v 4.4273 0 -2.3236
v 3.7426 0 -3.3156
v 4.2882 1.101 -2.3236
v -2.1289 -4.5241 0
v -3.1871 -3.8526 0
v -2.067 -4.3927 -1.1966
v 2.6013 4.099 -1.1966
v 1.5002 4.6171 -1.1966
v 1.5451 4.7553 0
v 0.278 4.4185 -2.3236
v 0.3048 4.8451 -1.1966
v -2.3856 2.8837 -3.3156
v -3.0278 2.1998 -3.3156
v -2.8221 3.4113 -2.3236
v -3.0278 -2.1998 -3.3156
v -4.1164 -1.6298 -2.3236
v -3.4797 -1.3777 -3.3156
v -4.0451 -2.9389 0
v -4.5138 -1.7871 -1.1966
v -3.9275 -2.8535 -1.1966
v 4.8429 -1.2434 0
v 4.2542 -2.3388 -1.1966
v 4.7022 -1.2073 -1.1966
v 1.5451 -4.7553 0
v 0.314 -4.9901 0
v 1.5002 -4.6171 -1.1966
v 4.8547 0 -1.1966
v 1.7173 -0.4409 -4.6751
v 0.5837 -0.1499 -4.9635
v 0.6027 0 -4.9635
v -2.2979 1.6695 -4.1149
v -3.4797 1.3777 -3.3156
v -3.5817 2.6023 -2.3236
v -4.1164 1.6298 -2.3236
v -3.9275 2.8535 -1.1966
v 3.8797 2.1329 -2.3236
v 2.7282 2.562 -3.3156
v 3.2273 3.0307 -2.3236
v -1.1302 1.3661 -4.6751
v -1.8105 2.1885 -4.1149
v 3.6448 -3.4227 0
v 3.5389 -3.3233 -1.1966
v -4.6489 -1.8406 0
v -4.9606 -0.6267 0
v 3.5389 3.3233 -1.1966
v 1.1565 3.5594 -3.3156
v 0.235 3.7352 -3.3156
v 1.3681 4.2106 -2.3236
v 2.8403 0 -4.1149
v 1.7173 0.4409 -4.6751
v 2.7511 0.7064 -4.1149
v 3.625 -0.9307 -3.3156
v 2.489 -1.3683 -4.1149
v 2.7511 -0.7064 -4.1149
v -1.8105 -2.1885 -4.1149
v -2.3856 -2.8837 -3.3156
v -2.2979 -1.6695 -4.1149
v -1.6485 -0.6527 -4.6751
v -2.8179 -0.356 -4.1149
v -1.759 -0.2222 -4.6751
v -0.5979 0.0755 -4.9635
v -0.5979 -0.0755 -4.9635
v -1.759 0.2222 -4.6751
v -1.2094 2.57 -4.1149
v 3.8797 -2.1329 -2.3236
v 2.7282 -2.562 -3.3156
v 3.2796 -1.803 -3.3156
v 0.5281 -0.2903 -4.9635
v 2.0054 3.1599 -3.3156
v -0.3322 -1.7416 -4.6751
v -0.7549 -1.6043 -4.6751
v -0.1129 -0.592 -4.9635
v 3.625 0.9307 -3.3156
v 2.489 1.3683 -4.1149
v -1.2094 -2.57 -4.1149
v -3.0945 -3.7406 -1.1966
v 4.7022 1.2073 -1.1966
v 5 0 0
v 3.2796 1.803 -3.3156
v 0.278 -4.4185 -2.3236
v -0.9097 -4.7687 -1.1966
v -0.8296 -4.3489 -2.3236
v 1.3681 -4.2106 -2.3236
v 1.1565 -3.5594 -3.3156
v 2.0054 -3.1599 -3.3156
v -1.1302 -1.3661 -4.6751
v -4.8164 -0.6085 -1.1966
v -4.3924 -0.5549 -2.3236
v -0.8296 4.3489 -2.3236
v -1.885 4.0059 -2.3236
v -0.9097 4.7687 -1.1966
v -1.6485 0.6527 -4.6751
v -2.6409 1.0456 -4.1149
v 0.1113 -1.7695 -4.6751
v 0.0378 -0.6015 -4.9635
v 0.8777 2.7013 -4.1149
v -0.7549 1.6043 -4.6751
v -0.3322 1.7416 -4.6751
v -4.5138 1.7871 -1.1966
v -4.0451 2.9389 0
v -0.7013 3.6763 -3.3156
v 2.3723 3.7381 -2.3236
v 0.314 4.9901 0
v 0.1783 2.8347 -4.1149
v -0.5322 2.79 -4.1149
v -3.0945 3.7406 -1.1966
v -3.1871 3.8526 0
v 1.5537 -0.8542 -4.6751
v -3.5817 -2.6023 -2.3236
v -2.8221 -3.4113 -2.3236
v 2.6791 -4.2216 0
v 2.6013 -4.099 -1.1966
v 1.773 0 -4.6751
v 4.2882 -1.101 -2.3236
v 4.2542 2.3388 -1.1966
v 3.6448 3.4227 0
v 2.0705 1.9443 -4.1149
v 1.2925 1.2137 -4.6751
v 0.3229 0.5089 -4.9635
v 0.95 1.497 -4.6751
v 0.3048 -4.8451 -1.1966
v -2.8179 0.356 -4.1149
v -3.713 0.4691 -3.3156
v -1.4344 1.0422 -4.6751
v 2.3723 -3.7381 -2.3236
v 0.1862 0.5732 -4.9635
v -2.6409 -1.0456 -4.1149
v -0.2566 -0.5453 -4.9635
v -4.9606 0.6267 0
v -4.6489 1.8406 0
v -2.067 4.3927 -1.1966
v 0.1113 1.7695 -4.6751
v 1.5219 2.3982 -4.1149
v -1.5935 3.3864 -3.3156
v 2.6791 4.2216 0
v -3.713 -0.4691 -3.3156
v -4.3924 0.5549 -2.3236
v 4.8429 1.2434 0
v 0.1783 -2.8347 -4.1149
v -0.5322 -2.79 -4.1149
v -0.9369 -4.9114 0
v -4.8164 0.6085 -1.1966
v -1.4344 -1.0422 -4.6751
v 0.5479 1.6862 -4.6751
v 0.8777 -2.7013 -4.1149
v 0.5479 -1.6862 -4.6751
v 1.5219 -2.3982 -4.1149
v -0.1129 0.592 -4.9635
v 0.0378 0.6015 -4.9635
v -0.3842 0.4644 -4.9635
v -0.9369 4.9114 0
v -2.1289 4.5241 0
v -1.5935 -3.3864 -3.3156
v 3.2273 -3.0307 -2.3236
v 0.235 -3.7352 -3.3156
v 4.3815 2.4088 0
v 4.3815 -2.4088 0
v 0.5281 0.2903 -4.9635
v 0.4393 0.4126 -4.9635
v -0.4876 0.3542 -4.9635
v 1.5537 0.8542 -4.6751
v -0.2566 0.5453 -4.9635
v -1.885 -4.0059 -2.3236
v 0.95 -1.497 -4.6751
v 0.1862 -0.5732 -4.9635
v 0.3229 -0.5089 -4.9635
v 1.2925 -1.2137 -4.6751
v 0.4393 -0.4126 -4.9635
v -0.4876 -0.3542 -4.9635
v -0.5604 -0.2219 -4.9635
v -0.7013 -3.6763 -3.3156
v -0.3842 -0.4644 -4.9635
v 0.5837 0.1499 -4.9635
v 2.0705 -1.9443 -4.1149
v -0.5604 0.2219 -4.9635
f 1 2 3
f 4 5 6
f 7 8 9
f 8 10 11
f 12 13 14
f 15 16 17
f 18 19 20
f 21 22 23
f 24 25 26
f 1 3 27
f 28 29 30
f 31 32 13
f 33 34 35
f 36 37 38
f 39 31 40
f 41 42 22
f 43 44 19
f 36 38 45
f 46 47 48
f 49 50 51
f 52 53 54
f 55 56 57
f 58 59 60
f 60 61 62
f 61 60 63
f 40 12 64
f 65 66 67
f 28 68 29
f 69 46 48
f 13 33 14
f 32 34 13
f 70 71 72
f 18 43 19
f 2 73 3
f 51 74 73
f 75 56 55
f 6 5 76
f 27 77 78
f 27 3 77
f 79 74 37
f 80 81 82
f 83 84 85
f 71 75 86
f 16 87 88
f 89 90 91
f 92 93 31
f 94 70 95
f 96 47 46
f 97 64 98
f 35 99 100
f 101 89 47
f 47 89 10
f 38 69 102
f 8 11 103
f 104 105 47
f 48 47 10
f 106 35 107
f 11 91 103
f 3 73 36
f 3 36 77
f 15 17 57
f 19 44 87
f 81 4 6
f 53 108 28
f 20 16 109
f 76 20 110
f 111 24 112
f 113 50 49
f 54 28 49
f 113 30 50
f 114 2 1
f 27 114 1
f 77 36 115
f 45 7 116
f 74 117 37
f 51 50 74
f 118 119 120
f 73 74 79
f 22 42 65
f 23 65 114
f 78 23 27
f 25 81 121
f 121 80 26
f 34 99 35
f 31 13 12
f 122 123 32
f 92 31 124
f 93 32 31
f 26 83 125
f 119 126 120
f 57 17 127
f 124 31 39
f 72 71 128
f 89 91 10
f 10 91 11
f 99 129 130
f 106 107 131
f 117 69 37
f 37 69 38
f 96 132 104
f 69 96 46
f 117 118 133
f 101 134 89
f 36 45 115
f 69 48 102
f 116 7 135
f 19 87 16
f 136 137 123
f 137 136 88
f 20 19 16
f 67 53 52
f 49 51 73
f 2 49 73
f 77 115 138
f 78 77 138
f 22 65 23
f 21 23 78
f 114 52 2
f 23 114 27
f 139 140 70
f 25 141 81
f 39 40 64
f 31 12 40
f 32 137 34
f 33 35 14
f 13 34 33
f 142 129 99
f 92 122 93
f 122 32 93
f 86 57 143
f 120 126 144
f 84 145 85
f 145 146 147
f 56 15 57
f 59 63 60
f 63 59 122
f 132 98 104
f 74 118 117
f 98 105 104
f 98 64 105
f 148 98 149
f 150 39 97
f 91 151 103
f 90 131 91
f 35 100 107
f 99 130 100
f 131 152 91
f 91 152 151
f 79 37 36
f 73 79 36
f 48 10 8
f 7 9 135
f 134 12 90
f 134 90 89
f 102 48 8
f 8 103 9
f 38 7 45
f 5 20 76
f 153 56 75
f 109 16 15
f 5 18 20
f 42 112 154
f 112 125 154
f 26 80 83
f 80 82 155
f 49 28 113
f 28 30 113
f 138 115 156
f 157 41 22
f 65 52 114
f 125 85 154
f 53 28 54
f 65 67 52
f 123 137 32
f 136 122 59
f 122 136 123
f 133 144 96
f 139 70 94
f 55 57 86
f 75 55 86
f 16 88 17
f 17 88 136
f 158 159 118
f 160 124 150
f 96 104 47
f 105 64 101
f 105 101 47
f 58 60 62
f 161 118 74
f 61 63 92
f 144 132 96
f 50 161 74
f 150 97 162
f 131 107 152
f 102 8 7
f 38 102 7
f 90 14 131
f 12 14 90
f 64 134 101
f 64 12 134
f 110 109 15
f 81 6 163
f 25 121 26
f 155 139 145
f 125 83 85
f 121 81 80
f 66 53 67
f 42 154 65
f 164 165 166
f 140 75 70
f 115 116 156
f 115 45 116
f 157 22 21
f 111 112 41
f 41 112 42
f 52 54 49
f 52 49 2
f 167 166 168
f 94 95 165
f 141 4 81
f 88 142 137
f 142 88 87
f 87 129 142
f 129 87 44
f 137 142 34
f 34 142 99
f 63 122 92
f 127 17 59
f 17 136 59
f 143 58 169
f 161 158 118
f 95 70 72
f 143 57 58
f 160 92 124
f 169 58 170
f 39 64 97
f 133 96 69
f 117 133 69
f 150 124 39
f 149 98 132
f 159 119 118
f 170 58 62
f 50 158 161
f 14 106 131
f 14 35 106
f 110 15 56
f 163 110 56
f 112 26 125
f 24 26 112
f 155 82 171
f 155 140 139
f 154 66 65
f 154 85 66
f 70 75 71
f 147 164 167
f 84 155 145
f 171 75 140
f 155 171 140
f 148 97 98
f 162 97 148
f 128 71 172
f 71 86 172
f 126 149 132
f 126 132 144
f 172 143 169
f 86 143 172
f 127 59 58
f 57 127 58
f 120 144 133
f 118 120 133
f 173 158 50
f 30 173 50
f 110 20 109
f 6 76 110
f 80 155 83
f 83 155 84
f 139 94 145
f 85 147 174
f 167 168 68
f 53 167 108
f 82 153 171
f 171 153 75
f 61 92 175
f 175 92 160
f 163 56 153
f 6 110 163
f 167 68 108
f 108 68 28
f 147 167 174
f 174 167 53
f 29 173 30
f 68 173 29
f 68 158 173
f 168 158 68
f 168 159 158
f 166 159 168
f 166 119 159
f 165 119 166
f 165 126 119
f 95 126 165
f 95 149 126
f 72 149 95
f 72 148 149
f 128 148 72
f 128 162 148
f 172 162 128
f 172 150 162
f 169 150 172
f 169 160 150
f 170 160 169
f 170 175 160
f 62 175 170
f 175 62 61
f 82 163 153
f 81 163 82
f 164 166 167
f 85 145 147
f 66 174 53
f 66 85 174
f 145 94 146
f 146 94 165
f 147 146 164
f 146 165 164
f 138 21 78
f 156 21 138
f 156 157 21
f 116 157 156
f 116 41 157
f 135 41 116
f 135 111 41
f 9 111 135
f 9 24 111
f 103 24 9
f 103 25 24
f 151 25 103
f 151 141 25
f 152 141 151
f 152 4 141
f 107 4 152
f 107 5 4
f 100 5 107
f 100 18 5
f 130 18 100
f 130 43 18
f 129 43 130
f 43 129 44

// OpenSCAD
tent_angle=15;
tent_rotate=[0, tent_angle, 0];
offset_x=-35;
bottom_padding=11;
pcb_depth=16;
slop=4.9;
caseRounding=5;
casePadding=5;
pcbLip=-8;

main();


module caseOutline() {
    hull() {
        offset(casePadding)
        pcb2D();
    }
}

module caseOutlineWrist() {
    hull() {
        offset(casePadding)
        //pcb2DWrist();
        pcb2D();
    }
}

module caseOutlineMinOffset() {
    hull() {
        offset(casePadding-caseRounding)
        //pcb2DWrist();
        pcb2D();

    }
}

module pcb3D() {
    translate([0, 0, -pcb_depth+0.1])
        linear_extrude(height=pcb_depth, center=false, convexity=10)
        pcb2D();
}

module pcb2D() {
    translate([offset_x, 0, 0])
        rotate([0, 180, -5])
        offset(r=slop)
        import(file = "panel.dxf", $fn=100, convexity=10);
}

module pcb2DWrist() {
    translate([offset_x, 0, 0])
        rotate([0, 180, -5])
        offset(r=slop)
        import(file = "panel.dxf", $fn=100, convexity=10);

    translate([offset_x, -70, 0])
        rotate([0, 180, 5])
        square(100);
        
}

module main() {
    difference() {
        // primary tent shape
        union() {
            // bottom padding
            translate([0, 0, -bottom_padding]) 
                linear_extrude(bottom_padding)
                projection(cut = false)
                linear_extrude(height=0.1, center=false, convexity=10)
                rotate(a=tent_rotate)
                caseOutlineWrist();
             minkowski() {               
                // wedge
                difference() {        
                    linear_extrude(100)
                        projection(cut = false)
                        rotate(a=tent_rotate)
                        difference() {
                            linear_extrude(height=0.1, center=false, convexity=10)
                                caseOutlineMinOffset();
                            // battery/mcu cutout 
                            translate([-132+offset_x, 31, -10])
                                cube([50, 70, 90]);
                        }
                        
                        
                    // cut out wedge on angle
                    rotate(a=tent_rotate)
                        translate([-250, -100, -caseRounding])
                        cube([250, 350, 100]);
                }
                sphere(caseRounding,$fn=25);
            }
        } 
       // pcb inset cutout
        translate([0, 0, 0])
            rotate(a=tent_rotate)
            pcb3D();

        // inner hole
        difference() {
            translate([0, 0, -10])
                linear_extrude(height=100, center=false, convexity=10)
                projection(cut = false)
                linear_extrude(height=0.1, center=false, convexity=10)
                rotate(a=tent_rotate)
                offset(pcbLip)
                pcb2D();
            // extra strength for outter edge
            rotate([0, 0, -20])
                translate([-21+offset_x, -22, -pcb_depth-bottom_padding]) 
                cube([20, 48, 30]);
        } 

        // bottom text
        translate([-50, -10, -bottom_padding-1.6])
            rotate([180, 0, 90])
            linear_extrude(1)
            text(str(tent_angle, "°"));
        cylinder(10,10,2);  
    }
    
}
